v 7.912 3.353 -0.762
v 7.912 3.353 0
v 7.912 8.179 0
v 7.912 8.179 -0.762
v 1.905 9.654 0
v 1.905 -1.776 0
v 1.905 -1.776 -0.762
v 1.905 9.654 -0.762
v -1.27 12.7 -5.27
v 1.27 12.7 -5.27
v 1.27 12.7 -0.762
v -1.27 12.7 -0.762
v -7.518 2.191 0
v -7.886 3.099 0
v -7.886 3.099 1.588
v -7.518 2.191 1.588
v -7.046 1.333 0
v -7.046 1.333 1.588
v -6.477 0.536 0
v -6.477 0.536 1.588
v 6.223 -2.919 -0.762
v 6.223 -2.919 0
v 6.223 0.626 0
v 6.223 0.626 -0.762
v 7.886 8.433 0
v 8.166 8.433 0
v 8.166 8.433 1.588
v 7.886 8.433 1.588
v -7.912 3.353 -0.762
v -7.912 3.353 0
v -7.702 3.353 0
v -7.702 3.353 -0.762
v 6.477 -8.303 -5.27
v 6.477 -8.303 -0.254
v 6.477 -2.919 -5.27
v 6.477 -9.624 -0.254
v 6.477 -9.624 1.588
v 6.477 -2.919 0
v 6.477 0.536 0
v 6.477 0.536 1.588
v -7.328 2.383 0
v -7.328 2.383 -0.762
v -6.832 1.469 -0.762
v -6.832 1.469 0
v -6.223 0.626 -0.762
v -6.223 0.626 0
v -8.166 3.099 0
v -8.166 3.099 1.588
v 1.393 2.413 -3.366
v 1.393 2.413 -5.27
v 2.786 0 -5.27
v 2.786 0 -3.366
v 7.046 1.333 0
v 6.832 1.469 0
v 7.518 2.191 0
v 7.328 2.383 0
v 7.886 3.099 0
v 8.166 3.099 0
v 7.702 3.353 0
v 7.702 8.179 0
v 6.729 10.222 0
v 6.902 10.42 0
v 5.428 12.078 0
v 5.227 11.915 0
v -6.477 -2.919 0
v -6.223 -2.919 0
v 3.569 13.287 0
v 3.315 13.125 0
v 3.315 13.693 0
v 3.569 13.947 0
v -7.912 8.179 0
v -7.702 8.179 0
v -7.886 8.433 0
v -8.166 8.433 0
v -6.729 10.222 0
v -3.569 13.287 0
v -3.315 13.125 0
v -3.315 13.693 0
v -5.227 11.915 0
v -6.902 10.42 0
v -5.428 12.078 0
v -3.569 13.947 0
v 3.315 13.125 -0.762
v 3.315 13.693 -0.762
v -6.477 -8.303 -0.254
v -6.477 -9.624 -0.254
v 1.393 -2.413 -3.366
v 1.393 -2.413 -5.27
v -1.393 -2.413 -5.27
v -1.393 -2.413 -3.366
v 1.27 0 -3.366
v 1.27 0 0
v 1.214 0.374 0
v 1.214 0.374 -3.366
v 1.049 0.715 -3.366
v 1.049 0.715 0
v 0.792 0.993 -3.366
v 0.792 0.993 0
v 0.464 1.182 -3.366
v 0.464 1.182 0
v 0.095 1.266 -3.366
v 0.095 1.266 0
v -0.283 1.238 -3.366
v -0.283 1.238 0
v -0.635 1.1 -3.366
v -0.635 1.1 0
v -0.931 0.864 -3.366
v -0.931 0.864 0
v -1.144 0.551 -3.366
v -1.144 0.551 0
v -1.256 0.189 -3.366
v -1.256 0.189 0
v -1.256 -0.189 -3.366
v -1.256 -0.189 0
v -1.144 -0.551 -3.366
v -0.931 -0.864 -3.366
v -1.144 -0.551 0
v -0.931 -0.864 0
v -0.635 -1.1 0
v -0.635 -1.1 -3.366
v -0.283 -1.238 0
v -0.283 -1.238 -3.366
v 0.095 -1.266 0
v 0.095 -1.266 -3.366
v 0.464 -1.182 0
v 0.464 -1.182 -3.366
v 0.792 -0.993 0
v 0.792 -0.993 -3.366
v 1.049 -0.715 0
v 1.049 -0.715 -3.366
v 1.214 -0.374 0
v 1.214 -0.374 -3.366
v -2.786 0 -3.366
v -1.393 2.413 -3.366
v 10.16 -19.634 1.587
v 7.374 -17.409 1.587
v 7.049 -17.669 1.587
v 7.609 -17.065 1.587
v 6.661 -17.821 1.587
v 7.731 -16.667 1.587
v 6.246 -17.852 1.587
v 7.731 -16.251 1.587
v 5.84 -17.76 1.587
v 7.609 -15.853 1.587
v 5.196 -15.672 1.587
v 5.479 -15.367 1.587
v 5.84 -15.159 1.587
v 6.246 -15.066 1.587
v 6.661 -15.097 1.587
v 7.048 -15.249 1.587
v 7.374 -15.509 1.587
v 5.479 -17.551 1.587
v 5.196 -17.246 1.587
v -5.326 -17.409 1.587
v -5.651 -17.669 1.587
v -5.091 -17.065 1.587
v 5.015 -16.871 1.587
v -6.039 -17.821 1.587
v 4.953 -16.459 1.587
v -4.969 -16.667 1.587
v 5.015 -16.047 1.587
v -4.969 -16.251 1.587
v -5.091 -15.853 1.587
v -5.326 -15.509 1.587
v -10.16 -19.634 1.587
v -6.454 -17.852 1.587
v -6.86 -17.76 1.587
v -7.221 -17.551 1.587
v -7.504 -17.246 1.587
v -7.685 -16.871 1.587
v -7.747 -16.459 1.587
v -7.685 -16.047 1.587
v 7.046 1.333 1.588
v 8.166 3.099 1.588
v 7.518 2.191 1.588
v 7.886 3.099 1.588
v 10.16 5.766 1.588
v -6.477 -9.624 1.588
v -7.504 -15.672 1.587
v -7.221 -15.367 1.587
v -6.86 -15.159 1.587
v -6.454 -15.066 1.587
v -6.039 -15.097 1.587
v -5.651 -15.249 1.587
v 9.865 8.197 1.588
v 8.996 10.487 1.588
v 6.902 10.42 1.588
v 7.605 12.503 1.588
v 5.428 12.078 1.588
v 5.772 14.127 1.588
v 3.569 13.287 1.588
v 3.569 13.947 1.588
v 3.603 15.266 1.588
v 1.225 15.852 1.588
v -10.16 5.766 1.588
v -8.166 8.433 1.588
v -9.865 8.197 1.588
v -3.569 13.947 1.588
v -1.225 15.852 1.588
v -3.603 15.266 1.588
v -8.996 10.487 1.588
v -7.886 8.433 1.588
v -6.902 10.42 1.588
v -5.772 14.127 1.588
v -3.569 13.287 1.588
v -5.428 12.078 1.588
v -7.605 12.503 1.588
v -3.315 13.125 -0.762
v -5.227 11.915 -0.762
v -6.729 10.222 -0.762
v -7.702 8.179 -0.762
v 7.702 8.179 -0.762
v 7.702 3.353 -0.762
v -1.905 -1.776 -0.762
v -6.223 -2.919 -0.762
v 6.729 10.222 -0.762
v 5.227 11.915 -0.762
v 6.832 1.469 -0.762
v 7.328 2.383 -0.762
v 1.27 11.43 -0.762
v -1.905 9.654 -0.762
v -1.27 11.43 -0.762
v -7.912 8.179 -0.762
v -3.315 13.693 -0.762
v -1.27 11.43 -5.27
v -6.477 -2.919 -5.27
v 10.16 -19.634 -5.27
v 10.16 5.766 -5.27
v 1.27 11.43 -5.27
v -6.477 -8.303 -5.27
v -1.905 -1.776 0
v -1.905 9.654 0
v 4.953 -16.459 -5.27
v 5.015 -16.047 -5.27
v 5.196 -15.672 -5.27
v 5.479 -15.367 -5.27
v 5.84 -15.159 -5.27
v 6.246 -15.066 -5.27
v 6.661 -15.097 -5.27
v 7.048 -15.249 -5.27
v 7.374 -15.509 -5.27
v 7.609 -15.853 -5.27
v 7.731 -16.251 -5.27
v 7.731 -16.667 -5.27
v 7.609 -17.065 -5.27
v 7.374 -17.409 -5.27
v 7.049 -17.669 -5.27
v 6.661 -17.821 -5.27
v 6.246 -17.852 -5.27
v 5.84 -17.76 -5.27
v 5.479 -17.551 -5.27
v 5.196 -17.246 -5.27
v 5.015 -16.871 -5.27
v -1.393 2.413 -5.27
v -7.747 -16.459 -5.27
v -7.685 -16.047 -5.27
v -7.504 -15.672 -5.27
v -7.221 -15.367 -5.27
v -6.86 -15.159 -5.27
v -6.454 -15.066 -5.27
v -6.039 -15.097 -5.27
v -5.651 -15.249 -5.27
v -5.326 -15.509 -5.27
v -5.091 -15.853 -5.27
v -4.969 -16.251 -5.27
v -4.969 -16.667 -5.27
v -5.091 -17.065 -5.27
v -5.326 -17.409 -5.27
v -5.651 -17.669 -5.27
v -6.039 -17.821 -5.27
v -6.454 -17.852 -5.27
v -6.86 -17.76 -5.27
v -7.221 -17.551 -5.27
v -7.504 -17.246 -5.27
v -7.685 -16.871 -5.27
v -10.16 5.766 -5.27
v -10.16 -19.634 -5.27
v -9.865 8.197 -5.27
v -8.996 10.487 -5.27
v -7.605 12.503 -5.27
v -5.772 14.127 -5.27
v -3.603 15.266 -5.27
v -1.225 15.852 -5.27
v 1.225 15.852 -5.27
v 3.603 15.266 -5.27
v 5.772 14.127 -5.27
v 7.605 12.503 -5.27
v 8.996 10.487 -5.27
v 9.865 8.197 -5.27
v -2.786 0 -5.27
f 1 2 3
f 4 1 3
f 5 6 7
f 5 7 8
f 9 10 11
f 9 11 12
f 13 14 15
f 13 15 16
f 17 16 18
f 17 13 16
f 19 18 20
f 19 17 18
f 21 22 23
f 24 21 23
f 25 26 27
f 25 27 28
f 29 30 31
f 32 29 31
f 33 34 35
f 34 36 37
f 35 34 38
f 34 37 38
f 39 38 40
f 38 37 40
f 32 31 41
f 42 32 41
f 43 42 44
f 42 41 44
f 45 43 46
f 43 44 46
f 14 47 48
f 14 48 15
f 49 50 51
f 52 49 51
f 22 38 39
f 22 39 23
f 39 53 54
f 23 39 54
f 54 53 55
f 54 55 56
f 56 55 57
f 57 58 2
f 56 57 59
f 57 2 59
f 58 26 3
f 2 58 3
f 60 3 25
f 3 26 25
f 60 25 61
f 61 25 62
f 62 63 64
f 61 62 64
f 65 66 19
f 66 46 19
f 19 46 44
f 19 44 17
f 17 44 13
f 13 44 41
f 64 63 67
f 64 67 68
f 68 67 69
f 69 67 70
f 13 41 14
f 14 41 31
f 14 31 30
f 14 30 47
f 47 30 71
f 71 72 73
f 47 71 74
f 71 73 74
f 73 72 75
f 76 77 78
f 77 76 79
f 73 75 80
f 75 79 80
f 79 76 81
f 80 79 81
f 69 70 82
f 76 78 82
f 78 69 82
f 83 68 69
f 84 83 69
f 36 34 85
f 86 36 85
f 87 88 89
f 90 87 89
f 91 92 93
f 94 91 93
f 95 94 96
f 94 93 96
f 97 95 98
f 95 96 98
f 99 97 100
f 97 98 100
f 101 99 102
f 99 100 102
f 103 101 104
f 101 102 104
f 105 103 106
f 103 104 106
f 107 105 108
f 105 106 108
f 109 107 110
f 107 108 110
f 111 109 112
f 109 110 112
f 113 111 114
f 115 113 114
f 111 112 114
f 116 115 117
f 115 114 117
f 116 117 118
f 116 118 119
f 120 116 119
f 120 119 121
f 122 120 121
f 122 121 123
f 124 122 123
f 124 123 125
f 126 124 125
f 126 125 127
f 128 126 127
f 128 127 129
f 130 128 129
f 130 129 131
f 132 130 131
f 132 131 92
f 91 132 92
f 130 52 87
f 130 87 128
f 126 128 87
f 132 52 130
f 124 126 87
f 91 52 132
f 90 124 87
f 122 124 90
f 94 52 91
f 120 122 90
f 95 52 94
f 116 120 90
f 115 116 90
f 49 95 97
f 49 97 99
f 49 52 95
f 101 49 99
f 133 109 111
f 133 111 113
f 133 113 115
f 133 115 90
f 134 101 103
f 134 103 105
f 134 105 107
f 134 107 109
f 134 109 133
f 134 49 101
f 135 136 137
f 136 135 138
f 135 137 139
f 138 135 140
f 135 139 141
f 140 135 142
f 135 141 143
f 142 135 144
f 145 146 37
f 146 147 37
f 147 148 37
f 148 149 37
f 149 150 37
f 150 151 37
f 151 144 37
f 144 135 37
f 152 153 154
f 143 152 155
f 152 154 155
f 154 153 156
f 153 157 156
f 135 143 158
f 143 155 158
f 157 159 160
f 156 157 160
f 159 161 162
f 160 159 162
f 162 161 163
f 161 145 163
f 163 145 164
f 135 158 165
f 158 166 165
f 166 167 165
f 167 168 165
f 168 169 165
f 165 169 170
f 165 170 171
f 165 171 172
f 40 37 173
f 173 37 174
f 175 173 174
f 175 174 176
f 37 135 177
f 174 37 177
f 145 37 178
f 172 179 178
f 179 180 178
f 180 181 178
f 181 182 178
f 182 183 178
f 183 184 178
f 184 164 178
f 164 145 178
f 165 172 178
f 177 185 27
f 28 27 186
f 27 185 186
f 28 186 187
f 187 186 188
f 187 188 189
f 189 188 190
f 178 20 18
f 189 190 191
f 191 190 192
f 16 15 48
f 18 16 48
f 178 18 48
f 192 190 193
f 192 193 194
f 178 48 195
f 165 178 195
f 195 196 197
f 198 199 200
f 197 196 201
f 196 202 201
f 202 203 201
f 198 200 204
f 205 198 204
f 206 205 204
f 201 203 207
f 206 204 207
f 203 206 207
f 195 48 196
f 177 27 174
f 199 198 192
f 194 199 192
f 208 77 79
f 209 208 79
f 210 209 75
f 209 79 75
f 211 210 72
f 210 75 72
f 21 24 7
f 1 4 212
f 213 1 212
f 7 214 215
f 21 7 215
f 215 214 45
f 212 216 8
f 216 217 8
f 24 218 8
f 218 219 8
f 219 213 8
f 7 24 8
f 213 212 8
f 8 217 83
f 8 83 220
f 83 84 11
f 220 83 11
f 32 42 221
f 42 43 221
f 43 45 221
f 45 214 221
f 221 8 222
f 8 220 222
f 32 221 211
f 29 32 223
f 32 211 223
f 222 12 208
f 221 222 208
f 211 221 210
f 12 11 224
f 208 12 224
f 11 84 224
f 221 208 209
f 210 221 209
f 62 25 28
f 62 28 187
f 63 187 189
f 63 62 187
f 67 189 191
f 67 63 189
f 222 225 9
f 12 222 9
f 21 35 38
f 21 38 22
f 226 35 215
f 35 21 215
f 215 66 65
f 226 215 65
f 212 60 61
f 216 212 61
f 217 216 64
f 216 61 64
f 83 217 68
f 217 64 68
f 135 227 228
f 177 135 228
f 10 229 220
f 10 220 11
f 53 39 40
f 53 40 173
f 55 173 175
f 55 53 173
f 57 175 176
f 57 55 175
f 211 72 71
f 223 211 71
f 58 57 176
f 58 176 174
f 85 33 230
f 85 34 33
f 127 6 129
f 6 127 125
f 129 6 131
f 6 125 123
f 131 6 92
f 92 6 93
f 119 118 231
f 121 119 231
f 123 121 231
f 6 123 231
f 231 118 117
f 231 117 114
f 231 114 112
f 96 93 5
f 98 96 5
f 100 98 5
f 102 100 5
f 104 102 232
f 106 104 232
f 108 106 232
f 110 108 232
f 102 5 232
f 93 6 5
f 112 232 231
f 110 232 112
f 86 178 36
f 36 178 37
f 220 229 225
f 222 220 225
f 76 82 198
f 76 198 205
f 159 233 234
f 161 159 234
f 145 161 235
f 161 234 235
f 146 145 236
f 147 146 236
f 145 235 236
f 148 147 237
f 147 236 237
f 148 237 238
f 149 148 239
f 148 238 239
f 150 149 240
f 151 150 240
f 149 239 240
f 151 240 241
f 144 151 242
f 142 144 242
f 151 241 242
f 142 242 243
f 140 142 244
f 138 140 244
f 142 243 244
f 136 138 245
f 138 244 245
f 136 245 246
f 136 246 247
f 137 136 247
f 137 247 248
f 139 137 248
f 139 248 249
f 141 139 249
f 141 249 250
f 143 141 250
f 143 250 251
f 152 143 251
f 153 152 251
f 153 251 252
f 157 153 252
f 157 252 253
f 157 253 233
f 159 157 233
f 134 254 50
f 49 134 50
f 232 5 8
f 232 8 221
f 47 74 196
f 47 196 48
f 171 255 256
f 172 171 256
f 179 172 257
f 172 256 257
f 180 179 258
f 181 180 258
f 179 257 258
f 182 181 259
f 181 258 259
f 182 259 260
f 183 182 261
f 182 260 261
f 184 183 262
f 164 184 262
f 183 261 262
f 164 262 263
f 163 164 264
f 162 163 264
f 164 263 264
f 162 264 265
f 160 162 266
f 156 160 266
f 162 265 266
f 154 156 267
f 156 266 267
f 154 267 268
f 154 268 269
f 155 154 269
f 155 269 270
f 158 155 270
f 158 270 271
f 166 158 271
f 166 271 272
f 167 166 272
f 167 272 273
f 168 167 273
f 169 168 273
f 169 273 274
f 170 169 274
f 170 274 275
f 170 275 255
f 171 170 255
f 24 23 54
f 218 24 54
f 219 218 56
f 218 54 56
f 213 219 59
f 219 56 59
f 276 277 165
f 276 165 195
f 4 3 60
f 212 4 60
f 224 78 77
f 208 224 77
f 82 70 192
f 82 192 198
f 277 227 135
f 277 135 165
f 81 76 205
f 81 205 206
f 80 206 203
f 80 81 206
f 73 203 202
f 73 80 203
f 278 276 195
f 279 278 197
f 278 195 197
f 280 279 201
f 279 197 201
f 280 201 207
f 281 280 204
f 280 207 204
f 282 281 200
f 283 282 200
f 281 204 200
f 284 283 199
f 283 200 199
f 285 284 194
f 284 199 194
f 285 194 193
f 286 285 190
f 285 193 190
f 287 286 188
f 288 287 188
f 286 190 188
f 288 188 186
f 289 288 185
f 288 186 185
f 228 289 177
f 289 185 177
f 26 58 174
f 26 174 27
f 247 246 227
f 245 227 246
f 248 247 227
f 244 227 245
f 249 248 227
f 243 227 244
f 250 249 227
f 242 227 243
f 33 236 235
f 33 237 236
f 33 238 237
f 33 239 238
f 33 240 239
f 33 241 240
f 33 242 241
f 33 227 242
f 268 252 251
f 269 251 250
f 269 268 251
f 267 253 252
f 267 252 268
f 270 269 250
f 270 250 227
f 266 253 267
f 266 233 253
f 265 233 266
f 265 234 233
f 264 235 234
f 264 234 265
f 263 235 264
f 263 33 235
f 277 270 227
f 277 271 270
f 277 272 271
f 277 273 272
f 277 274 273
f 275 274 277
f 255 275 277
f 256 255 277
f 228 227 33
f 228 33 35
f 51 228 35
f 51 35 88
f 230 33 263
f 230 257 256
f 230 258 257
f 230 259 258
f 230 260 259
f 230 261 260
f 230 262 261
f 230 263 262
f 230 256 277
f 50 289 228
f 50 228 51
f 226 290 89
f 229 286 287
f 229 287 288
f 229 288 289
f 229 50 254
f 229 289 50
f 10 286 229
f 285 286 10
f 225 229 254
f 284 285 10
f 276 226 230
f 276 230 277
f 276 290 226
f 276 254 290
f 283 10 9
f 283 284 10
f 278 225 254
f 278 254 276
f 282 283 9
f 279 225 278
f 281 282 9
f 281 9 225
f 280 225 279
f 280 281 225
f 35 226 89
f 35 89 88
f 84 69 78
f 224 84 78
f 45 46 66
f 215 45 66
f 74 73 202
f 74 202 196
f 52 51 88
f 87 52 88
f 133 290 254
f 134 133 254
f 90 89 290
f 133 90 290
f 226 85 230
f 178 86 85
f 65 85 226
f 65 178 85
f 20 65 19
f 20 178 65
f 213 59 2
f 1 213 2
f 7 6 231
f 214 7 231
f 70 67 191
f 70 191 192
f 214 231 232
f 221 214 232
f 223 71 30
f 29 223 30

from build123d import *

# Parameters (mm, degrees)
BOSS_EXTRUDE1_DEPTH     = 1.5875
SKETCH3_W               = 3.81
SKETCH3_H               = 11.43
BOSS_EXTRUDE2_DEPTH     = 0.762
SKETCH4_W               = 12.954
SKETCH4_H               = 1.3208
BOSS_EXTRUDE3_DEPTH     = 0.508
SKETCH5_W               = 12.954
SKETCH5_H               = 5.3848
BOSS_EXTRUDE4_DEPTH     = 4.5085
SKETCH2_R               = 1.27
CUT_EXTRUDE1_DEPTH      = 20.612110439
CUT_EXTRUDE1_DEPTH_BACK = 20.612110439
CUT_EXTRUDE2_DEPTH      = 1.905
SKETCH7_W               = 20.32
SKETCH7_H               = 6.9342
BOSS_EXTRUDE5_DEPTH     = 6.858
SKETCH8_R               = 1.397
CUT_EXTRUDE3_DEPTH      = 24.146480805
SKETCH9_W               = 2.54
SKETCH9_H               = 1.27
CUT_EXTRUDE4_DEPTH      = 24.146480805


with BuildPart() as part:
    # Sketch1 → Boss-Extrude1 (new body)
    with BuildSketch(Plane.XY):
        with BuildLine():
            Line((-10.16, 5.7658), (-10.16, -12.7))
            Line((-10.16, -12.7), (10.16, -12.7))
            Line((10.16, -12.7), (10.16, 5.7658))
            ThreePointArc((10.16, 5.7658), (0, 15.9258), (-10.16, 5.7658))
        make_face()
        with BuildLine():
            Line((-8.1661, 8.4328), (-8.1661, 3.0988))
            Line((-8.1661, 3.0988), (-7.88607878, 3.0988))
            ThreePointArc((-7.88607878, 3.0988), (-7.294970241, 1.754997498), (-6.477, 0.535924426))
            Line((-6.477, 0.535924426), (-6.477, -9.624254818))
            Line((-6.477, -9.624254818), (6.477, -9.624254818))
            Line((6.477, -9.624254818), (6.477, 0.535924426))
            ThreePointArc((6.477, 0.535924426), (7.294970241, 1.754997498), (7.88607878, 3.0988))
            Line((7.88607878, 3.0988), (8.1661, 3.0988))
            Line((8.1661, 3.0988), (8.1661, 8.4328))
            Line((8.1661, 8.4328), (7.88607878, 8.4328))
            ThreePointArc((7.88607878, 8.4328), (6.220422148, 11.298383105), (3.5687, 13.286937403))
            Line((3.5687, 13.286937403), (3.5687, 13.946945182))
            Line((3.5687, 13.946945182), (-3.5687, 13.946945182))
            Line((-3.5687, 13.946945182), (-3.5687, 13.286937403))
            ThreePointArc((-3.5687, 13.286937403), (-6.220422148, 11.298383105), (-7.88607878, 8.4328))
            Line((-7.88607878, 8.4328), (-8.1661, 8.4328))
        make_face(mode=Mode.SUBTRACT)
    extrude(amount=BOSS_EXTRUDE1_DEPTH)

    # Sketch3 → Boss-Extrude2 (add)
    with BuildSketch(Plane(origin=(0, 0, 0), x_dir=(-1, 0, 0), z_dir=(0, 0, -1))):
        with BuildLine():
            Line((-10.16, -12.7), (10.16, -12.7))
            Line((10.16, -12.7), (10.16, 5.7658))
            ThreePointArc((10.16, 5.7658), (0, 15.9258), (-10.16, 5.7658))
            Line((-10.16, 5.7658), (-10.16, -12.7))
        make_face()
        with BuildLine():
            Line((-6.477, -9.624254818), (-6.477, -2.918654818))
            Line((-6.477, -2.918654818), (-6.223, -2.918654818))
            Line((-6.223, -2.918654818), (-6.223, 0.535924426))
            Line((-6.223, 0.535924426), (-6.223, 0.626452695))
            ThreePointArc((-6.223, 0.626452695), (-7.094540168, 1.917927921), (-7.70169142, 3.3528))
            Line((-7.70169142, 3.3528), (-7.9121, 3.3528))
            Line((-7.9121, 3.3528), (-7.9121, 8.1788))
            Line((-7.9121, 8.1788), (-7.70169142, 8.1788))
            ThreePointArc((-7.70169142, 8.1788), (-6.037827534, 11.121475344), (-3.3147, 13.124562371))
            Line((-3.3147, 13.124562371), (-3.3147, 13.692945182))
            Line((-3.3147, 13.692945182), (3.3147, 13.692945182))
            Line((3.3147, 13.692945182), (3.3147, 13.124562371))
            ThreePointArc((3.3147, 13.124562371), (6.037827534, 11.121475344), (7.70169142, 8.1788))
            Line((7.70169142, 8.1788), (7.9121, 8.1788))
            Line((7.9121, 8.1788), (7.9121, 3.3528))
            Line((7.9121, 3.3528), (7.70169142, 3.3528))
            ThreePointArc((7.70169142, 3.3528), (7.094540168, 1.917927921), (6.223, 0.626452695))
            Line((6.223, 0.626452695), (6.223, -2.918654818))
            Line((6.223, -2.918654818), (6.477, -2.918654818))
            Line((6.477, -2.918654818), (6.477, -9.624254818))
            Line((6.477, -9.624254818), (-6.223, -9.624254818))
            Line((-6.223, -9.624254818), (-6.477, -9.624254818))
        make_face(mode=Mode.SUBTRACT)
        with Locations((0, 3.939345182)):
            Rectangle(SKETCH3_W, SKETCH3_H)
    extrude(amount=BOSS_EXTRUDE2_DEPTH)


with BuildPart() as boss_extrude2_piece_1:
    # of the separate pieces the step leaves, piece 1, a body of its own (boss_extrude2_pieces)
    add(part.part.solids().sort_by_distance((-10.16, 5.7658, 1.5875))[0])

    # Sketch4 → Boss-Extrude3 (add)
    with BuildSketch(Plane(origin=(0, 0, -0.762), x_dir=(-1, 0, 0), z_dir=(0, 0, -1))):
        with Locations((0, -8.963854818)):
            Rectangle(SKETCH4_W, SKETCH4_H)
    extrude(amount=-BOSS_EXTRUDE3_DEPTH)



with BuildPart() as boss_extrude2_piece_2:
    # of the separate pieces the step leaves, piece 2, a body of its own (boss_extrude2_pieces)
    add(part.part.solids().sort_by_distance((-1.905, -1.775654818, 0))[0])


with BuildPart() as boss_extrude2_piece_1_1:
    add(boss_extrude2_piece_1.part)

    add(boss_extrude2_piece_2.part)  # Boss-Extrude4 merges Boss-Extrude2 piece 2
    # Sketch5 → Boss-Extrude4 (add)
    with BuildSketch(Plane(origin=(0, 0, -0.762), x_dir=(-1, 0, 0), z_dir=(0, 0, -1))):
        with BuildLine():
            Line((10.16, -12.7), (10.16, 5.7658))
            ThreePointArc((10.16, 5.7658), (0, 15.9258), (-10.16, 5.7658))
            Line((-10.16, 5.7658), (-10.16, -12.7))
            Line((-10.16, -12.7), (10.16, -12.7))
        make_face()
        with Locations((0, -5.611054818)):
            Rectangle(SKETCH5_W, SKETCH5_H, mode=Mode.SUBTRACT)
    extrude(amount=BOSS_EXTRUDE4_DEPTH)

    # Sketch2 → Cut-Extrude1 (cut, two sides)
    with BuildSketch(Plane.XY) as cut_extrude1_sk:
        Circle(SKETCH2_R)
    extrude(amount=CUT_EXTRUDE1_DEPTH, mode=Mode.SUBTRACT)
    extrude(cut_extrude1_sk.sketch, amount=-CUT_EXTRUDE1_DEPTH_BACK, mode=Mode.SUBTRACT)

    # Sketch6 → Cut-Extrude2 (cut)
    with BuildSketch(Plane(origin=(0, 0, -5.2705), x_dir=(-1, 0, 0), z_dir=(0, 0, -1))):
        Polygon((1.3931462, 2.413), (-1.3931462, 2.413), (-2.786292399, 0), (-1.3931462, -2.413), (1.3931462, -2.413), (2.786292399, 0), align=None)
    extrude(amount=-CUT_EXTRUDE2_DEPTH, mode=Mode.SUBTRACT)

    # Sketch7 → Boss-Extrude5 (add)
    with BuildSketch(Plane(origin=(0, 0, -5.2705), x_dir=(-1, 0, 0), z_dir=(0, 0, -1))):
        with Locations((0, -16.1671)):
            Rectangle(SKETCH7_W, SKETCH7_H)
    extrude(amount=-BOSS_EXTRUDE5_DEPTH)

    # Sketch8 → Cut-Extrude3 (cut, through all)
    with BuildSketch(Plane(origin=(0, 0, -5.2705), x_dir=(-1, 0, 0), z_dir=(0, 0, -1))):
        with Locations((-6.35, -16.4592)):
            Circle(SKETCH8_R)
        with Locations((6.35, -16.4592)):
            Circle(SKETCH8_R)
    extrude(amount=-CUT_EXTRUDE3_DEPTH, mode=Mode.SUBTRACT)

    # Sketch9 → Cut-Extrude4 (cut, through all)
    with BuildSketch(Plane(origin=(0, 0, -5.2705), x_dir=(-1, 0, 0), z_dir=(0, 0, -1))):
        with Locations((0, 12.065)):
            Rectangle(SKETCH9_W, SKETCH9_H)
    extrude(amount=-CUT_EXTRUDE4_DEPTH, mode=Mode.SUBTRACT)


solid = boss_extrude2_piece_1_1.part
